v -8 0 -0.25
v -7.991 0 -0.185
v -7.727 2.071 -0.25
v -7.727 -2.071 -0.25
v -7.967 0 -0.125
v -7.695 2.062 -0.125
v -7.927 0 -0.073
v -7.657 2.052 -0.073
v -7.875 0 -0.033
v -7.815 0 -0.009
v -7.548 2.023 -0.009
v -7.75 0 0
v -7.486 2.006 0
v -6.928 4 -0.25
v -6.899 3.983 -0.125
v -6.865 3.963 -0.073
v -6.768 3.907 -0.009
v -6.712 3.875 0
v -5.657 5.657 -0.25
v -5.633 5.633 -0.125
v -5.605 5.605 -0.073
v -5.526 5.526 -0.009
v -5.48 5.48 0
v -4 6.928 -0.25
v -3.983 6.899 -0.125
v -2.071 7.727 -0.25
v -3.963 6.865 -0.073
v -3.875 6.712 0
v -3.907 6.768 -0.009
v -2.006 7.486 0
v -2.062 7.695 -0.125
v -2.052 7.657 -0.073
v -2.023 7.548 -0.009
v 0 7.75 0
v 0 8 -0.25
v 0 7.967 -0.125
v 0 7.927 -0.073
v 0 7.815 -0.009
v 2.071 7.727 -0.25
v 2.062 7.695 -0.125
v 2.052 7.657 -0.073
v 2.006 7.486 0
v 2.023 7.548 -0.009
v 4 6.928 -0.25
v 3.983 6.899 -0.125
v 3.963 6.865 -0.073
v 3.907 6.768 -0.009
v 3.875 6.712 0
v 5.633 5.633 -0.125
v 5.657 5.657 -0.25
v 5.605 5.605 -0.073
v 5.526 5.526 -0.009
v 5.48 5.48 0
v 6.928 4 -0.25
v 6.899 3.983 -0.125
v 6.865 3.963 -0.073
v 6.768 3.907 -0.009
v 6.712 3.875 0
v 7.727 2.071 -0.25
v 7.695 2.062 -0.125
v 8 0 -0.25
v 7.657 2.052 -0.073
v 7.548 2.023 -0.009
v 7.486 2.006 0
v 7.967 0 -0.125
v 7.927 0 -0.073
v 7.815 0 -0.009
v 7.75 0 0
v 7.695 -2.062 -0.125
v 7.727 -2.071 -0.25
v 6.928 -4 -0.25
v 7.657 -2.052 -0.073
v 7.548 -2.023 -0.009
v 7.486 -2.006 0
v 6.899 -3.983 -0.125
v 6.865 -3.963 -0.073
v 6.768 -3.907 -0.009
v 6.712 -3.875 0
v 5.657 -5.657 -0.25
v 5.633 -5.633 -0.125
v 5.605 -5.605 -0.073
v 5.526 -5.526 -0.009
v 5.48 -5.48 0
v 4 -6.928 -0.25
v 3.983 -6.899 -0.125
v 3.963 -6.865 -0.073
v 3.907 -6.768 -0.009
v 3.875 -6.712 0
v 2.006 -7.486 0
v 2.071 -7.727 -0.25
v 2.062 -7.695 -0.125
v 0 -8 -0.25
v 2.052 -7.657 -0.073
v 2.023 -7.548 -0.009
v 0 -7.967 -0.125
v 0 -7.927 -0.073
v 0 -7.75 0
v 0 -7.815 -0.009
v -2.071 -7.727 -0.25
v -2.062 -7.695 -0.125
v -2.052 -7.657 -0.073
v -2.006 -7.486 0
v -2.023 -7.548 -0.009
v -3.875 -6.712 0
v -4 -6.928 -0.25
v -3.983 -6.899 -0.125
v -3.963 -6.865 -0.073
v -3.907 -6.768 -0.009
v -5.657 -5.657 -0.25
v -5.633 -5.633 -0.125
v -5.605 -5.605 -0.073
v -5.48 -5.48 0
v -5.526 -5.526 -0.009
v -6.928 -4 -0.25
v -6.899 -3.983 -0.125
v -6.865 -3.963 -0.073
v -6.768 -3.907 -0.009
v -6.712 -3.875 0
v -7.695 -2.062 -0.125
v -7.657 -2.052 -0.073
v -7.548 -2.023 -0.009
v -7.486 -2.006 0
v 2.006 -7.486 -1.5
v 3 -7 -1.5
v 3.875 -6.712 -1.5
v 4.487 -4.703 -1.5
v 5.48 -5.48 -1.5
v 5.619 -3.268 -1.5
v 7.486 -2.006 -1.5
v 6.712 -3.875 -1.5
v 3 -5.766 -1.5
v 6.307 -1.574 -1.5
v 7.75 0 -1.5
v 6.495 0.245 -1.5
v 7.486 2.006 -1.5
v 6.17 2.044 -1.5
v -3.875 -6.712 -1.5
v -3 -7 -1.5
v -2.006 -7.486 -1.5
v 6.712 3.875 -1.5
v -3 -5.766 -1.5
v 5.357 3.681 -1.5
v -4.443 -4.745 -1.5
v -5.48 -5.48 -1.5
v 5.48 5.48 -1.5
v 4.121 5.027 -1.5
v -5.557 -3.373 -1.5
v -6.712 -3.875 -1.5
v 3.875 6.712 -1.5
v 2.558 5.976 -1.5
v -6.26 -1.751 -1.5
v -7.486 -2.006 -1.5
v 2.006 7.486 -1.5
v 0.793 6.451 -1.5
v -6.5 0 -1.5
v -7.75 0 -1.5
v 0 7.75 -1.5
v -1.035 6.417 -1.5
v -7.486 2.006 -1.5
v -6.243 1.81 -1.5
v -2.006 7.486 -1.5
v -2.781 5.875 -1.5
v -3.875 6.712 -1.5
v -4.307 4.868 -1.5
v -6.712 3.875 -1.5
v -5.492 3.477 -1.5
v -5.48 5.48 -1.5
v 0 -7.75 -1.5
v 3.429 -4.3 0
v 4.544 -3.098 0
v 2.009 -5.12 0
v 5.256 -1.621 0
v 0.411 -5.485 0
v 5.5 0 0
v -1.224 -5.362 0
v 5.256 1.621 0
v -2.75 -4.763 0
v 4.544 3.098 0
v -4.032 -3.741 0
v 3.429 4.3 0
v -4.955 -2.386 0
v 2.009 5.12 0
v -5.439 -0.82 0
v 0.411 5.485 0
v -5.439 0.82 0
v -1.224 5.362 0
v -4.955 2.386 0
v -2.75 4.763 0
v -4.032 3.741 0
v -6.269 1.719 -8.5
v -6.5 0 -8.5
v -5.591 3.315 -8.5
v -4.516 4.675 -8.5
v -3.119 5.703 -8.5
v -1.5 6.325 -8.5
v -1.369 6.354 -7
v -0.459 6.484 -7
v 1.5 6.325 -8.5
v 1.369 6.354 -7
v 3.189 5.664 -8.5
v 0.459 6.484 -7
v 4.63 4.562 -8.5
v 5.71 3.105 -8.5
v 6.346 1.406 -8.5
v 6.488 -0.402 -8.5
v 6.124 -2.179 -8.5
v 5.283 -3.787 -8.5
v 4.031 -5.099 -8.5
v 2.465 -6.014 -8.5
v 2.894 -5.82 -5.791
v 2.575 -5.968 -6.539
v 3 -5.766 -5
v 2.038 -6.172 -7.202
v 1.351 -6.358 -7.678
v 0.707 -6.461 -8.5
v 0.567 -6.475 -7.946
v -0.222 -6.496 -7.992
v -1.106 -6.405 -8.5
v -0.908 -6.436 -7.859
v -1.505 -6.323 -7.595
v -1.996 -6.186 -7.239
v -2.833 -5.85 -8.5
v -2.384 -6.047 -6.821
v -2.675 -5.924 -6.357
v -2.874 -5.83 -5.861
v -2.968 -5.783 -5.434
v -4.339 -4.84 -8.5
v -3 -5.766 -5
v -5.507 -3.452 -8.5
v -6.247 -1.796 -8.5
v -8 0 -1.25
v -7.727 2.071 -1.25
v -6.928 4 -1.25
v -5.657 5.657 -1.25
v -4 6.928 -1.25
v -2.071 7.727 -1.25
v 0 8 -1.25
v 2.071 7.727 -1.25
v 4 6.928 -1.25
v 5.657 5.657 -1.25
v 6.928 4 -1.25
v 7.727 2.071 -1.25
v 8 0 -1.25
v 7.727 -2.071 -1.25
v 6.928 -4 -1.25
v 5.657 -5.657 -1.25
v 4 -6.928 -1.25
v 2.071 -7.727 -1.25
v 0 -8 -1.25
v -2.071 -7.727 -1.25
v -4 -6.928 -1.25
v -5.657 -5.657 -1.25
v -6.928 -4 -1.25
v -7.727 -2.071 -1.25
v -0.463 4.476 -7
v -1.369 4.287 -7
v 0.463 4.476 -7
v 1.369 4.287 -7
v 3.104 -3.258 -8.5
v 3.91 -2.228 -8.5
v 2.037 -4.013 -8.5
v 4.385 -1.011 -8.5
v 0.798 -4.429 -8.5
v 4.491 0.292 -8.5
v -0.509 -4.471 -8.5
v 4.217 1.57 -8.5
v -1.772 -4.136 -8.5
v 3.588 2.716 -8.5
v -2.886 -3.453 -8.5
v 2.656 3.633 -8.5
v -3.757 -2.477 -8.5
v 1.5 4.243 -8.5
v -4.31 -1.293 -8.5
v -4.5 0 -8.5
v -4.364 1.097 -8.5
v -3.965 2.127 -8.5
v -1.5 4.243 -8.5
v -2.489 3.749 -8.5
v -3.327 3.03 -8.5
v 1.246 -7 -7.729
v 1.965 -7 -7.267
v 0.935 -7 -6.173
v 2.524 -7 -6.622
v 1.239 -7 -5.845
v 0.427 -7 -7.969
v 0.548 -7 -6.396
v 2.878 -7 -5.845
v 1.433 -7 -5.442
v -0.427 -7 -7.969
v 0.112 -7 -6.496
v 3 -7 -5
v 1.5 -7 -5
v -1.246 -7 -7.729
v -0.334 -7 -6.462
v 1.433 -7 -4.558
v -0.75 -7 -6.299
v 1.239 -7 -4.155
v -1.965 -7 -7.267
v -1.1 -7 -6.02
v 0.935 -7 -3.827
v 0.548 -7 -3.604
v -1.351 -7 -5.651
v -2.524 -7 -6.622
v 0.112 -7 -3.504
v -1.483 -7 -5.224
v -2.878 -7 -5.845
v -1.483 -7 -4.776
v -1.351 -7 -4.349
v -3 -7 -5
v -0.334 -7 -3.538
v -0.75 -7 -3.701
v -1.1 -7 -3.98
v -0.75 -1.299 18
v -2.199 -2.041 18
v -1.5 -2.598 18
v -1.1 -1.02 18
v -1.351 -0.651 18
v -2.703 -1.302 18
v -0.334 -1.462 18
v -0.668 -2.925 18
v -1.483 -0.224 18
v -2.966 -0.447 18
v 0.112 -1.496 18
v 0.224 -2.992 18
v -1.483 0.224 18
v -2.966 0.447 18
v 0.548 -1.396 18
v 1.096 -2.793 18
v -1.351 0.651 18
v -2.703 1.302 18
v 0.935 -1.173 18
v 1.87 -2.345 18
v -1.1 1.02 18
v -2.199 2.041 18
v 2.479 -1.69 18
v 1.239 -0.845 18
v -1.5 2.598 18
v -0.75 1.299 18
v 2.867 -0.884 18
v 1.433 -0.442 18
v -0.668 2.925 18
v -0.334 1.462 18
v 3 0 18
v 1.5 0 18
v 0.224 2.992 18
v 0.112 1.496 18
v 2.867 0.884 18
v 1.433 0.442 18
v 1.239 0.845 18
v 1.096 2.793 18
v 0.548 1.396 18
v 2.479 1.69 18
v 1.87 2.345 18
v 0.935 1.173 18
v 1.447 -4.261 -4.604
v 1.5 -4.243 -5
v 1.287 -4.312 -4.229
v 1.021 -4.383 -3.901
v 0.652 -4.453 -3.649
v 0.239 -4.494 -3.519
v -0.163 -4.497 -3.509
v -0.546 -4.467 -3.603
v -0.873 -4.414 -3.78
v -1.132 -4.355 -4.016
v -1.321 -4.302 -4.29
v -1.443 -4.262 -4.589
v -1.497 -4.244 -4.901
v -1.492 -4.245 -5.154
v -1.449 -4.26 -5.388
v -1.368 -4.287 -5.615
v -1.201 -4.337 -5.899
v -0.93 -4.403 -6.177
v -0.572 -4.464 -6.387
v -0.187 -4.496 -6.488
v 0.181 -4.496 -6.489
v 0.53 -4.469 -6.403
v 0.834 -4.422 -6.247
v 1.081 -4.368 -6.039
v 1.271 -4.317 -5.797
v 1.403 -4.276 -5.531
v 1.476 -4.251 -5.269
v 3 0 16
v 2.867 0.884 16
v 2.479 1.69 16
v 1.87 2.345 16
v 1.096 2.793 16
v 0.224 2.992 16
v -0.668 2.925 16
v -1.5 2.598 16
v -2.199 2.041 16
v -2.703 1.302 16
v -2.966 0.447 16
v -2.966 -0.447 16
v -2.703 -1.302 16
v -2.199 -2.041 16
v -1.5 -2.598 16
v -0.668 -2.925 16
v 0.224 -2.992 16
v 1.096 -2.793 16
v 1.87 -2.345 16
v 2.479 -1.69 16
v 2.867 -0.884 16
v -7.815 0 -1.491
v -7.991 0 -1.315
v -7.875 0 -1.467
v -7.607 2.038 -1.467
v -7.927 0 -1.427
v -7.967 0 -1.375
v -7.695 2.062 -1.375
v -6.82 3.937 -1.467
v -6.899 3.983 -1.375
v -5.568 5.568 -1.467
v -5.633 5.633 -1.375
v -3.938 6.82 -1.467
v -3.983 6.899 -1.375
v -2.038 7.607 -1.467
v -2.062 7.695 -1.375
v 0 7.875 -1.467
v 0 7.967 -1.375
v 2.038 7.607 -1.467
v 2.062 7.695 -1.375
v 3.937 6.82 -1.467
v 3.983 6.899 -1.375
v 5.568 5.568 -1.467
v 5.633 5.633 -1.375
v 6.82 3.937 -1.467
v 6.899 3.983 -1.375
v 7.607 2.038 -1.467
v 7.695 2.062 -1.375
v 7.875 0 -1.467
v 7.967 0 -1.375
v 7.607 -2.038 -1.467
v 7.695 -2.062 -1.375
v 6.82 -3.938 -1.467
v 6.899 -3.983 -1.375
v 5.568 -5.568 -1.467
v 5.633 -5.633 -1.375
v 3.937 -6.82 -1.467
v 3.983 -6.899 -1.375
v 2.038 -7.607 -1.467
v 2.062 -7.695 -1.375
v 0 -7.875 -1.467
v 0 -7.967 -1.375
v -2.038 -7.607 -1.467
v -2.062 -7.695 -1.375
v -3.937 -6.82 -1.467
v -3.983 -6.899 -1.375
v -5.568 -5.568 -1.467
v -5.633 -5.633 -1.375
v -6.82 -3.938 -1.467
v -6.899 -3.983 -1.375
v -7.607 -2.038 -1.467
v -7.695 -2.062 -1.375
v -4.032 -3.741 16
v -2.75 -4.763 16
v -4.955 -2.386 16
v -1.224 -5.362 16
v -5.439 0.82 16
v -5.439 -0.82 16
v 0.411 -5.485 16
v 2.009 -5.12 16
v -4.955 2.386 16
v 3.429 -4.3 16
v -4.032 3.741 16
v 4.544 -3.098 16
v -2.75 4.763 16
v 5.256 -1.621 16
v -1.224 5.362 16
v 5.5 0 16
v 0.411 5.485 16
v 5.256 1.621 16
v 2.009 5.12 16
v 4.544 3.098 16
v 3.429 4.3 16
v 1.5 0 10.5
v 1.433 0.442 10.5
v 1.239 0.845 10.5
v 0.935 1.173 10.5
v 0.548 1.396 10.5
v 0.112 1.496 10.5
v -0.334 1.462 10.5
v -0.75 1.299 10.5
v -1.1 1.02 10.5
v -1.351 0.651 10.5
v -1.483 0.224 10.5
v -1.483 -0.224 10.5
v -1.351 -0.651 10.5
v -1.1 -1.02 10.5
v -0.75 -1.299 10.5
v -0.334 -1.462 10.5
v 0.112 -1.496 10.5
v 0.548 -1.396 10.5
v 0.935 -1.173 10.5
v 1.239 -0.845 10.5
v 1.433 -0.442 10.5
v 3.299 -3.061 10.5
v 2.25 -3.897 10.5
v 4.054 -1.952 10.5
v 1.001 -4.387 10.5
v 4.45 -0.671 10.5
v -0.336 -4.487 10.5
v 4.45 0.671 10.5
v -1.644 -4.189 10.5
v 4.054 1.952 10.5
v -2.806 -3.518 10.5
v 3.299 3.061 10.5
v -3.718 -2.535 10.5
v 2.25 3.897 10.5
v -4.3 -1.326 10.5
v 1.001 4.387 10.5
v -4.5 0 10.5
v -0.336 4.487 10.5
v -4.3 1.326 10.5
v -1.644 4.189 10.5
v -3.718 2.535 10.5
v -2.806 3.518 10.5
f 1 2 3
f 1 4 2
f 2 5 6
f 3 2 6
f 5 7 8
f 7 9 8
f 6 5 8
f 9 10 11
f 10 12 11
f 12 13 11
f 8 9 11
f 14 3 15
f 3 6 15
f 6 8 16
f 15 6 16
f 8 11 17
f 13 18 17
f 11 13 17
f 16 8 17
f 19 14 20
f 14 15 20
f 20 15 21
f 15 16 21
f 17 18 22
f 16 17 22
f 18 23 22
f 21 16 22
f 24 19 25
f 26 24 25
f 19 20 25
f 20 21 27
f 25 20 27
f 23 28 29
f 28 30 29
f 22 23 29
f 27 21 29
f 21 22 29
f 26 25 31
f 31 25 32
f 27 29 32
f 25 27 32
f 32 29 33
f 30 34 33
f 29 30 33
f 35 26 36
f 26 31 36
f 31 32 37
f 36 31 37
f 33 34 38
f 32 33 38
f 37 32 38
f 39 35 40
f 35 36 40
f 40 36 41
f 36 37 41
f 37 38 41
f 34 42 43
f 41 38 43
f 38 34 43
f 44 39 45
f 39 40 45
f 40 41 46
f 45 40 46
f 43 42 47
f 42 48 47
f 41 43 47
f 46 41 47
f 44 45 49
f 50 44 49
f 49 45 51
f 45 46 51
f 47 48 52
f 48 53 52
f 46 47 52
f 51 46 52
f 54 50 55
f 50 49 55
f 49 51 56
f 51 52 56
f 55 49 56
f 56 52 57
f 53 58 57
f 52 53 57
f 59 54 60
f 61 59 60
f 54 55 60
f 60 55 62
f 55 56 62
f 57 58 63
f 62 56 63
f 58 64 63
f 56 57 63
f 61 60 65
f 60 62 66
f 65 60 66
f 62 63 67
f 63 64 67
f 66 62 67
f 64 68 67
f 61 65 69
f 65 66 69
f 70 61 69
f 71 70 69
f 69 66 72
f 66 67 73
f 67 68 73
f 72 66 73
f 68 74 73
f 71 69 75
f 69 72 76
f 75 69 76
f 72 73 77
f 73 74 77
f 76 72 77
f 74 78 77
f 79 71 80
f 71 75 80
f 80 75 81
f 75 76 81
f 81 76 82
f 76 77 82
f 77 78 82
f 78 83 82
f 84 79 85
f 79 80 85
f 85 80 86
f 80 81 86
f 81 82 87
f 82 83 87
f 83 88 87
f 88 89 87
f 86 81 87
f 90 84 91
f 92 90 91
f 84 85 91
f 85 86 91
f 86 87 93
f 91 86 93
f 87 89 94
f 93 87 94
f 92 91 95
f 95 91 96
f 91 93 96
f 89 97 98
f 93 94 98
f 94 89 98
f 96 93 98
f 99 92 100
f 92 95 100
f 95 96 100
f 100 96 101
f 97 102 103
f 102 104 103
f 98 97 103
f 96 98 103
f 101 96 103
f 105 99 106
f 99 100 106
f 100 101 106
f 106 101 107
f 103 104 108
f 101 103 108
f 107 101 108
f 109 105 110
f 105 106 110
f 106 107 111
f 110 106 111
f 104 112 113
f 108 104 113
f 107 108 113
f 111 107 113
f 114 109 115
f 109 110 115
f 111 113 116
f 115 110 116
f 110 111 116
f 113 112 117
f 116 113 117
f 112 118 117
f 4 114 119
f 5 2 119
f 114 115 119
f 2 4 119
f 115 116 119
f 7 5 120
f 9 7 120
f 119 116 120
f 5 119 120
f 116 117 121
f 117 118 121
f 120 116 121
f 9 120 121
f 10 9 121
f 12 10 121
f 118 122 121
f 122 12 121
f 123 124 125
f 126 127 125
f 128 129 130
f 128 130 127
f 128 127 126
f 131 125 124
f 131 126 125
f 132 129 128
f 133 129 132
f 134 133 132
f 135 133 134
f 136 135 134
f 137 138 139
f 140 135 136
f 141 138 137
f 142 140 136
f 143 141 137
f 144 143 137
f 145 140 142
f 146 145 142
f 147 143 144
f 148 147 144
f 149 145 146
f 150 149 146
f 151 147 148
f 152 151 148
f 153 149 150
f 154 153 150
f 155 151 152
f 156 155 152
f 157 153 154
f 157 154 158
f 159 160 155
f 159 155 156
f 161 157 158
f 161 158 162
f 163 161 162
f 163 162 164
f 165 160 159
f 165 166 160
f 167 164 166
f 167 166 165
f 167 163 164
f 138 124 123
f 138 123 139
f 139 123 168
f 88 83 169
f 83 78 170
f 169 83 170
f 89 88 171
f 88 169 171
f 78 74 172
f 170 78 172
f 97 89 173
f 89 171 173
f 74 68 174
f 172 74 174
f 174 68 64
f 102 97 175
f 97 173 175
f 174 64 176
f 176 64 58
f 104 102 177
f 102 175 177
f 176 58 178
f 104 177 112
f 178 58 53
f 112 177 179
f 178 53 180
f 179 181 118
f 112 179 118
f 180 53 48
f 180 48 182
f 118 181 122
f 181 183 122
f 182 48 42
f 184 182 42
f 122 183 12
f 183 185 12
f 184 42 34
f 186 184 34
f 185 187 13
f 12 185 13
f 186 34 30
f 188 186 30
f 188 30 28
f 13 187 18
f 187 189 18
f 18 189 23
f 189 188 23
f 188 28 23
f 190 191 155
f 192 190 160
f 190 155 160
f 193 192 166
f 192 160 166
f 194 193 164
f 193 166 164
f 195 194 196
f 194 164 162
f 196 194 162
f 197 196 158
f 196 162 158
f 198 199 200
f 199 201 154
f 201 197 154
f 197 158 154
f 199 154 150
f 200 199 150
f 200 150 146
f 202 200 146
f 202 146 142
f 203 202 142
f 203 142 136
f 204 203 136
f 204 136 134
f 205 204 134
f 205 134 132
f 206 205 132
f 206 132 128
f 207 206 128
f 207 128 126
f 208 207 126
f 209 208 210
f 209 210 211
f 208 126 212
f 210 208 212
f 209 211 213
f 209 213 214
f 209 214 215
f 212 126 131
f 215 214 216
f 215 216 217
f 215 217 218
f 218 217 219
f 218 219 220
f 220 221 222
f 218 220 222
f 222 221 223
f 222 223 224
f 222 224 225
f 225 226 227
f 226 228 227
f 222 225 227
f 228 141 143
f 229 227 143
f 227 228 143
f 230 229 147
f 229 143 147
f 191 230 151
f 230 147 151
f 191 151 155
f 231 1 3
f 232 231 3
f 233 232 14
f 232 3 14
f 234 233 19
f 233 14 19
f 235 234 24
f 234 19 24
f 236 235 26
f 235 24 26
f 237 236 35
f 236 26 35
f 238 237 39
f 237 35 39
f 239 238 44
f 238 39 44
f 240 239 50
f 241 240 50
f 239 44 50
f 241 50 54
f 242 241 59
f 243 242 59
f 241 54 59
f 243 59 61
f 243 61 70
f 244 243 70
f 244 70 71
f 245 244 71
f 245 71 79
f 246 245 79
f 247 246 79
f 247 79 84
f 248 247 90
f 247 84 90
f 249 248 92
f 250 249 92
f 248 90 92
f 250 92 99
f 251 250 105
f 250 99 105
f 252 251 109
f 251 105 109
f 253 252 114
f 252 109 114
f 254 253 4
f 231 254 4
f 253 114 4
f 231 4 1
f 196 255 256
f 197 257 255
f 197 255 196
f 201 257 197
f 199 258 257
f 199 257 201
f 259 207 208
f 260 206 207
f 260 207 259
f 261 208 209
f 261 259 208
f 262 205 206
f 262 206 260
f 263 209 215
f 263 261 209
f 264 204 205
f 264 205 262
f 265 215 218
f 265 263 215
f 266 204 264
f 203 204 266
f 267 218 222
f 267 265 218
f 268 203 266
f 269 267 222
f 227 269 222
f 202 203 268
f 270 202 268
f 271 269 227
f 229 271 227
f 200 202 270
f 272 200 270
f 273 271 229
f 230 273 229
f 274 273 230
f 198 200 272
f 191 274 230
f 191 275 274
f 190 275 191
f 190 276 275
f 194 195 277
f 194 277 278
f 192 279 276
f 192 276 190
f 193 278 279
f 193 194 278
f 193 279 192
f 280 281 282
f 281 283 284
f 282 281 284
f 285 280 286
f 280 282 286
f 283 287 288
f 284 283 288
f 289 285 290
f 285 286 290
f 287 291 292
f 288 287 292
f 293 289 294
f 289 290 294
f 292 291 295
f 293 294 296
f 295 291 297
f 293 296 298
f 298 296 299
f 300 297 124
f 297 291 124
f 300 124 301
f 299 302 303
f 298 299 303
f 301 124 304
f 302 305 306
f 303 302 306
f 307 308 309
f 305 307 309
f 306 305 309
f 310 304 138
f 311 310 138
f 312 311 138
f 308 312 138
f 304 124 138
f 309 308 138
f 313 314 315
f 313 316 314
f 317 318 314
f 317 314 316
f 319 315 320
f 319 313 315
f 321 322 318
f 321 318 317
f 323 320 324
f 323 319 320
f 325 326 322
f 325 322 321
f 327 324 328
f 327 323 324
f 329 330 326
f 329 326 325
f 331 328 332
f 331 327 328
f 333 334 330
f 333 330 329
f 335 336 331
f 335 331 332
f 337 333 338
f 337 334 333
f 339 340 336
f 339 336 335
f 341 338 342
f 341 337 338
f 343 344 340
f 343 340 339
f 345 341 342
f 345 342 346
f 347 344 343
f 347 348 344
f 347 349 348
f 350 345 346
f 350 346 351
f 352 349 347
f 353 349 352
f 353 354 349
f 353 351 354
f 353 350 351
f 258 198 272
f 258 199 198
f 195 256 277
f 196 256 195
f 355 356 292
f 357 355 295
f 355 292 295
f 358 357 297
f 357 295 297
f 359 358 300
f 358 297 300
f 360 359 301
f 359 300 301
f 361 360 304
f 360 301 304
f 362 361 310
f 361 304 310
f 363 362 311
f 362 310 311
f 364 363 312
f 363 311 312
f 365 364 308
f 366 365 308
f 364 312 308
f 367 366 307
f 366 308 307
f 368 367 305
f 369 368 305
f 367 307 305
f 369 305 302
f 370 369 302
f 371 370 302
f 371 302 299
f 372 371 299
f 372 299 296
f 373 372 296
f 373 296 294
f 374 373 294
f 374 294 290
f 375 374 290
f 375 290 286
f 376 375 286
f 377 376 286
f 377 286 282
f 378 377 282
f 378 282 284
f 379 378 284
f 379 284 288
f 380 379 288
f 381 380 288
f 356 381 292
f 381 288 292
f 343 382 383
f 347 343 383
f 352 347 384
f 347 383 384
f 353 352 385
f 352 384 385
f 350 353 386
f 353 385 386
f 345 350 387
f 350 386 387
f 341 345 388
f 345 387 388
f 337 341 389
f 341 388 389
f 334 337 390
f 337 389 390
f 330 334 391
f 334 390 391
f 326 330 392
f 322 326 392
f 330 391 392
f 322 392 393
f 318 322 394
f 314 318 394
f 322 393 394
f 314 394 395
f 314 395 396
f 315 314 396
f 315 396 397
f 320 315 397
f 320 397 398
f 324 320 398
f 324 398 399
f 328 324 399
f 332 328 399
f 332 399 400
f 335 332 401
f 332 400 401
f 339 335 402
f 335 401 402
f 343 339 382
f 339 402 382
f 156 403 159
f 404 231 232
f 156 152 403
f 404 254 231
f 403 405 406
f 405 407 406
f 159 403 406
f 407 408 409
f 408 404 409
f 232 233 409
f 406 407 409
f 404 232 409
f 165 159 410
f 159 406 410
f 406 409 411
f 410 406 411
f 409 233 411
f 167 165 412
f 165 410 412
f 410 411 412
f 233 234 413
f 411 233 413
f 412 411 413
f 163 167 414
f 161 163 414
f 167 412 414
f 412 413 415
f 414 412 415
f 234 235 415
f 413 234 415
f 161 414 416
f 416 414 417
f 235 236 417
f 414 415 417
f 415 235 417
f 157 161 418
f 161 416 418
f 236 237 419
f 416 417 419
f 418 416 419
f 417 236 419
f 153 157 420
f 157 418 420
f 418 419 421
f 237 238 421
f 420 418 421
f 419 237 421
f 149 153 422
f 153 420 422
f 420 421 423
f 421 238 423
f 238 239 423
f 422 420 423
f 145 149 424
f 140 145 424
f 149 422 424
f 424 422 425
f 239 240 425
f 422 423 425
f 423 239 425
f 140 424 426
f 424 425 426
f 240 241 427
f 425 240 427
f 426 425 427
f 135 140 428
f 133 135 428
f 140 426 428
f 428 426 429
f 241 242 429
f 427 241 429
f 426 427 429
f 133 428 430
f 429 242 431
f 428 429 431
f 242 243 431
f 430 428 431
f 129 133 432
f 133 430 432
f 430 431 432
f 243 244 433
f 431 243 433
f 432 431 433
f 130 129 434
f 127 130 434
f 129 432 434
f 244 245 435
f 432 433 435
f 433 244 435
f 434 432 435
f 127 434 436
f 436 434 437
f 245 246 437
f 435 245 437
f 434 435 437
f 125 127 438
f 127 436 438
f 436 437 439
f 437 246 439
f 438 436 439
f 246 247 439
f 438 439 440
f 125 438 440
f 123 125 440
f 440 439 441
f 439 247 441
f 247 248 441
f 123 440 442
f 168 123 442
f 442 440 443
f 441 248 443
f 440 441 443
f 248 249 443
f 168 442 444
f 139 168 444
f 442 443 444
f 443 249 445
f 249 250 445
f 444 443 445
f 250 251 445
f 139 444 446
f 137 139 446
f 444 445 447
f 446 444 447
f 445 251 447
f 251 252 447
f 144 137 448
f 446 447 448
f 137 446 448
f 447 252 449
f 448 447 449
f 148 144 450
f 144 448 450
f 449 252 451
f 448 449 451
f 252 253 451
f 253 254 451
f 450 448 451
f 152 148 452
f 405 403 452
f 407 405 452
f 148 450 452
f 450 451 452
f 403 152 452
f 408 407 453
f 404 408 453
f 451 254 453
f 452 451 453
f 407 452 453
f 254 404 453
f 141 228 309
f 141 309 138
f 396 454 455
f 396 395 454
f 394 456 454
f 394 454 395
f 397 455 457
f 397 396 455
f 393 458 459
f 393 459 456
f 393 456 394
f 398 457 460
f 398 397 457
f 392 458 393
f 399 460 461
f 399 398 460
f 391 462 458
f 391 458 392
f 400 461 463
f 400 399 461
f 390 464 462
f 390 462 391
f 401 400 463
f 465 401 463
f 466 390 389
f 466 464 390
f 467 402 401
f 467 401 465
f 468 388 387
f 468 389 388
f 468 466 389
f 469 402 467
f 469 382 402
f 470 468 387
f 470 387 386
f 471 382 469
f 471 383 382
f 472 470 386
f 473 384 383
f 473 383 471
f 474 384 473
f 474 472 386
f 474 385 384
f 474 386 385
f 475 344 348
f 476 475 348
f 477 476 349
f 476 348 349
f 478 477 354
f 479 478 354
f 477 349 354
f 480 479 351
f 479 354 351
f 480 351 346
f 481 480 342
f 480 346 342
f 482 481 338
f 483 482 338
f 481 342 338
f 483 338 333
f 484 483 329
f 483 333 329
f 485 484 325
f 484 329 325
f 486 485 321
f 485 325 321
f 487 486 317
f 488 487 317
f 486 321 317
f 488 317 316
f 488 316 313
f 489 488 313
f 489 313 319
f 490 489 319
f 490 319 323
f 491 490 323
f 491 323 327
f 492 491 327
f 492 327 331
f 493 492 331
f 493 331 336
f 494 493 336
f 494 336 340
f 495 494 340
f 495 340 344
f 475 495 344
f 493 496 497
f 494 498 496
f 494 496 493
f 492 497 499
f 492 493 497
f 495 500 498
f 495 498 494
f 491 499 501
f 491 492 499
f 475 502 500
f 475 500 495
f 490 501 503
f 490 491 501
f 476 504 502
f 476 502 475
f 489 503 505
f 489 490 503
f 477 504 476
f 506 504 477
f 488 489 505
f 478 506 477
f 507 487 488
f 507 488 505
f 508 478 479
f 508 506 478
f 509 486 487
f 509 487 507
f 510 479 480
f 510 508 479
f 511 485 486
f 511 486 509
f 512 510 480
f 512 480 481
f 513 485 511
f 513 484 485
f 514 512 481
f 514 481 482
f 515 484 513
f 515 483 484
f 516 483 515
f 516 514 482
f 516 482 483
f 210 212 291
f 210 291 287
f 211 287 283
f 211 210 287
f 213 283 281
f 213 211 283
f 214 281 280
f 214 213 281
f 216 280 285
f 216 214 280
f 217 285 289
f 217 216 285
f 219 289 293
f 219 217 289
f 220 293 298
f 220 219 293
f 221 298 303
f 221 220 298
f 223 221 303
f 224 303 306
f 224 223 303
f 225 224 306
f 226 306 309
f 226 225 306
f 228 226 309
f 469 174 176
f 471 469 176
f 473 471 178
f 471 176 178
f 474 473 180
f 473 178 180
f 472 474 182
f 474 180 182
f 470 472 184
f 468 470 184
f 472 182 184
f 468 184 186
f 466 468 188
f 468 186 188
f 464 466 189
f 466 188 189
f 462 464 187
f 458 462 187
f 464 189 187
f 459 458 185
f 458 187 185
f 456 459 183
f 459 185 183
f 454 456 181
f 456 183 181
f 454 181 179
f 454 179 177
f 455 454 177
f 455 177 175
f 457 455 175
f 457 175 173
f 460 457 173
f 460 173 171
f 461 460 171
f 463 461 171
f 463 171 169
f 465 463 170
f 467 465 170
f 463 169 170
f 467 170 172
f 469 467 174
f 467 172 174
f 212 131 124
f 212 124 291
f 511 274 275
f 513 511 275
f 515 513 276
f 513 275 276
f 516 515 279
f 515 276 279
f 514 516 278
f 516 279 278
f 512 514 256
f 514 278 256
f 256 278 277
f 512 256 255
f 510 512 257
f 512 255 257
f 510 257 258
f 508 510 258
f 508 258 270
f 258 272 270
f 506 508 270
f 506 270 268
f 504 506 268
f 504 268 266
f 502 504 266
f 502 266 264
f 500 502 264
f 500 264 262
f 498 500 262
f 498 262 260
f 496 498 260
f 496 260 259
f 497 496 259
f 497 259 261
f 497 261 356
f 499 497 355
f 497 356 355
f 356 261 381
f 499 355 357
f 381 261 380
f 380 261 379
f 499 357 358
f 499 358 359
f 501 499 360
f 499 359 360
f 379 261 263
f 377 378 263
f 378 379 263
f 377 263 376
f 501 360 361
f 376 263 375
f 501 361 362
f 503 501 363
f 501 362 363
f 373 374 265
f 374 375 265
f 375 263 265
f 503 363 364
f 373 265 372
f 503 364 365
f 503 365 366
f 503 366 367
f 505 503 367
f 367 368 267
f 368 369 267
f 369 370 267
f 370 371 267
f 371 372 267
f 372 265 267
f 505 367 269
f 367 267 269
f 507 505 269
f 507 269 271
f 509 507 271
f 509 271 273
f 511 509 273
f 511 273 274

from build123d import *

# Parameters (mm, degrees)
ESQUISSE1_R             = 5.5
BASE_EXTRUSION_DEPTH    = 16
ESQUISSE2_R             = 3
BOSS_EXTRU_1_DEPTH      = 2
ESQUISSE3_R             = 8
BOSS_EXTRU_2_DEPTH      = 1.5
ESQUISSE4_R             = 6.5
BOSS_EXTRU_3_DEPTH      = 7
ESQUISSE5_R             = 4.5
ENL_V_MAT_EXTRU_1_DEPTH = 19
ESQUISSE6_W             = 3
ESQUISSE6_H             = 4
ENL_V_MAT_EXTRU_2_DEPTH = 1.5
ENL_V_MAT_EXTRU_2_TAPER = 5
BOSS_EXTRU_4_DEPTH      = 2
ENL_V_MAT_EXTRU_3_REACH = 17
ESQUISSE8_R             = 1.5
ESQUISSE9_R             = 1.5
ENL_V_MAT_EXTRU_4_DEPTH = 27.5000001
CONG_2_R                = 0.25


with BuildPart() as part:
    # Esquisse1 → Base-Extrusion (new body)
    with BuildSketch(Plane.XY):
        Circle(ESQUISSE1_R)
    extrude(amount=BASE_EXTRUSION_DEPTH)

    # Esquisse2 → Boss.-Extru.1 (add)
    with BuildSketch(Plane.XY.offset(16)):
        Circle(ESQUISSE2_R)
    extrude(amount=BOSS_EXTRU_1_DEPTH)

    # Esquisse3 → Boss.-Extru.2 (add)
    with BuildSketch(Plane(origin=(0, 0, 0), x_dir=(-1, 0, 0), z_dir=(0, 0, -1))):
        Circle(ESQUISSE3_R)
    extrude(amount=BOSS_EXTRU_2_DEPTH)

    # Esquisse4 → Boss.-Extru.3 (add)
    with BuildSketch(Plane(origin=(0, 0, -1.5), x_dir=(-1, 0, 0), z_dir=(0, 0, -1))):
        Circle(ESQUISSE4_R)
    extrude(amount=BOSS_EXTRU_3_DEPTH)

    # Esquisse5 → Enlèv. mat.-Extru.1 (cut)
    with BuildSketch(Plane(origin=(0, 0, -8.5), x_dir=(-1, 0, 0), z_dir=(0, 0, -1))):
        Circle(ESQUISSE5_R)
    extrude(amount=-ENL_V_MAT_EXTRU_1_DEPTH, mode=Mode.SUBTRACT)

    # Esquisse6 → Enlèv. mat.-Extru.2 (cut)
    with BuildSketch(Plane(origin=(0, 0, -8.5), x_dir=(-1, 0, 0), z_dir=(0, 0, -1))):
        with Locations((0, 5)):
            Rectangle(ESQUISSE6_W, ESQUISSE6_H)
    extrude(amount=-ENL_V_MAT_EXTRU_2_DEPTH, taper=ENL_V_MAT_EXTRU_2_TAPER, mode=Mode.SUBTRACT)

    # Esquisse7 → Boss.-Extru.4 (add)
    with BuildSketch(Plane(origin=(0, -5, 0), x_dir=(-1, 0, 0), z_dir=(0, 1, 0))):
        with BuildLine():
            Line((3, -5), (3, -1.5))
            Line((3, -1.5), (-3, -1.5))
            Line((-3, -1.5), (-3, -5))
            ThreePointArc((-3, -5), (0, -8), (3, -5))
        make_face()
    extrude(amount=-BOSS_EXTRU_4_DEPTH)

    # Esquisse8 → Enlèv. mat.-Extru.3 (cut, up to next)
    with BuildSketch(Plane.XZ.offset(7), mode=Mode.PRIVATE) as enl_v_mat_extru_3_sk1:
        with Locations((0, -5)):
            Circle(ESQUISSE8_R)
    enl_v_mat_extru_3_tool1 = extrude(enl_v_mat_extru_3_sk1.sketch, amount=-ENL_V_MAT_EXTRU_3_REACH, mode=Mode.PRIVATE) & part.part
    add(enl_v_mat_extru_3_tool1.solids().sort_by_distance((0, -7, -5))[0], mode=Mode.SUBTRACT)

    # Esquisse9 → Enlèv. mat.-Extru.4 (cut, through all)
    with BuildSketch(Plane.XY.offset(18)):
        Circle(ESQUISSE9_R)
    extrude(amount=-ENL_V_MAT_EXTRU_4_DEPTH, mode=Mode.SUBTRACT)

    # Congé2
    cong_2_edges = [part.edges().sort_by_distance(p)[0] for p in [
        (8, 0, 0),
        (8, 0, -1.5),
    ]]
    fillet(cong_2_edges, radius=CONG_2_R)


solid = part.part
